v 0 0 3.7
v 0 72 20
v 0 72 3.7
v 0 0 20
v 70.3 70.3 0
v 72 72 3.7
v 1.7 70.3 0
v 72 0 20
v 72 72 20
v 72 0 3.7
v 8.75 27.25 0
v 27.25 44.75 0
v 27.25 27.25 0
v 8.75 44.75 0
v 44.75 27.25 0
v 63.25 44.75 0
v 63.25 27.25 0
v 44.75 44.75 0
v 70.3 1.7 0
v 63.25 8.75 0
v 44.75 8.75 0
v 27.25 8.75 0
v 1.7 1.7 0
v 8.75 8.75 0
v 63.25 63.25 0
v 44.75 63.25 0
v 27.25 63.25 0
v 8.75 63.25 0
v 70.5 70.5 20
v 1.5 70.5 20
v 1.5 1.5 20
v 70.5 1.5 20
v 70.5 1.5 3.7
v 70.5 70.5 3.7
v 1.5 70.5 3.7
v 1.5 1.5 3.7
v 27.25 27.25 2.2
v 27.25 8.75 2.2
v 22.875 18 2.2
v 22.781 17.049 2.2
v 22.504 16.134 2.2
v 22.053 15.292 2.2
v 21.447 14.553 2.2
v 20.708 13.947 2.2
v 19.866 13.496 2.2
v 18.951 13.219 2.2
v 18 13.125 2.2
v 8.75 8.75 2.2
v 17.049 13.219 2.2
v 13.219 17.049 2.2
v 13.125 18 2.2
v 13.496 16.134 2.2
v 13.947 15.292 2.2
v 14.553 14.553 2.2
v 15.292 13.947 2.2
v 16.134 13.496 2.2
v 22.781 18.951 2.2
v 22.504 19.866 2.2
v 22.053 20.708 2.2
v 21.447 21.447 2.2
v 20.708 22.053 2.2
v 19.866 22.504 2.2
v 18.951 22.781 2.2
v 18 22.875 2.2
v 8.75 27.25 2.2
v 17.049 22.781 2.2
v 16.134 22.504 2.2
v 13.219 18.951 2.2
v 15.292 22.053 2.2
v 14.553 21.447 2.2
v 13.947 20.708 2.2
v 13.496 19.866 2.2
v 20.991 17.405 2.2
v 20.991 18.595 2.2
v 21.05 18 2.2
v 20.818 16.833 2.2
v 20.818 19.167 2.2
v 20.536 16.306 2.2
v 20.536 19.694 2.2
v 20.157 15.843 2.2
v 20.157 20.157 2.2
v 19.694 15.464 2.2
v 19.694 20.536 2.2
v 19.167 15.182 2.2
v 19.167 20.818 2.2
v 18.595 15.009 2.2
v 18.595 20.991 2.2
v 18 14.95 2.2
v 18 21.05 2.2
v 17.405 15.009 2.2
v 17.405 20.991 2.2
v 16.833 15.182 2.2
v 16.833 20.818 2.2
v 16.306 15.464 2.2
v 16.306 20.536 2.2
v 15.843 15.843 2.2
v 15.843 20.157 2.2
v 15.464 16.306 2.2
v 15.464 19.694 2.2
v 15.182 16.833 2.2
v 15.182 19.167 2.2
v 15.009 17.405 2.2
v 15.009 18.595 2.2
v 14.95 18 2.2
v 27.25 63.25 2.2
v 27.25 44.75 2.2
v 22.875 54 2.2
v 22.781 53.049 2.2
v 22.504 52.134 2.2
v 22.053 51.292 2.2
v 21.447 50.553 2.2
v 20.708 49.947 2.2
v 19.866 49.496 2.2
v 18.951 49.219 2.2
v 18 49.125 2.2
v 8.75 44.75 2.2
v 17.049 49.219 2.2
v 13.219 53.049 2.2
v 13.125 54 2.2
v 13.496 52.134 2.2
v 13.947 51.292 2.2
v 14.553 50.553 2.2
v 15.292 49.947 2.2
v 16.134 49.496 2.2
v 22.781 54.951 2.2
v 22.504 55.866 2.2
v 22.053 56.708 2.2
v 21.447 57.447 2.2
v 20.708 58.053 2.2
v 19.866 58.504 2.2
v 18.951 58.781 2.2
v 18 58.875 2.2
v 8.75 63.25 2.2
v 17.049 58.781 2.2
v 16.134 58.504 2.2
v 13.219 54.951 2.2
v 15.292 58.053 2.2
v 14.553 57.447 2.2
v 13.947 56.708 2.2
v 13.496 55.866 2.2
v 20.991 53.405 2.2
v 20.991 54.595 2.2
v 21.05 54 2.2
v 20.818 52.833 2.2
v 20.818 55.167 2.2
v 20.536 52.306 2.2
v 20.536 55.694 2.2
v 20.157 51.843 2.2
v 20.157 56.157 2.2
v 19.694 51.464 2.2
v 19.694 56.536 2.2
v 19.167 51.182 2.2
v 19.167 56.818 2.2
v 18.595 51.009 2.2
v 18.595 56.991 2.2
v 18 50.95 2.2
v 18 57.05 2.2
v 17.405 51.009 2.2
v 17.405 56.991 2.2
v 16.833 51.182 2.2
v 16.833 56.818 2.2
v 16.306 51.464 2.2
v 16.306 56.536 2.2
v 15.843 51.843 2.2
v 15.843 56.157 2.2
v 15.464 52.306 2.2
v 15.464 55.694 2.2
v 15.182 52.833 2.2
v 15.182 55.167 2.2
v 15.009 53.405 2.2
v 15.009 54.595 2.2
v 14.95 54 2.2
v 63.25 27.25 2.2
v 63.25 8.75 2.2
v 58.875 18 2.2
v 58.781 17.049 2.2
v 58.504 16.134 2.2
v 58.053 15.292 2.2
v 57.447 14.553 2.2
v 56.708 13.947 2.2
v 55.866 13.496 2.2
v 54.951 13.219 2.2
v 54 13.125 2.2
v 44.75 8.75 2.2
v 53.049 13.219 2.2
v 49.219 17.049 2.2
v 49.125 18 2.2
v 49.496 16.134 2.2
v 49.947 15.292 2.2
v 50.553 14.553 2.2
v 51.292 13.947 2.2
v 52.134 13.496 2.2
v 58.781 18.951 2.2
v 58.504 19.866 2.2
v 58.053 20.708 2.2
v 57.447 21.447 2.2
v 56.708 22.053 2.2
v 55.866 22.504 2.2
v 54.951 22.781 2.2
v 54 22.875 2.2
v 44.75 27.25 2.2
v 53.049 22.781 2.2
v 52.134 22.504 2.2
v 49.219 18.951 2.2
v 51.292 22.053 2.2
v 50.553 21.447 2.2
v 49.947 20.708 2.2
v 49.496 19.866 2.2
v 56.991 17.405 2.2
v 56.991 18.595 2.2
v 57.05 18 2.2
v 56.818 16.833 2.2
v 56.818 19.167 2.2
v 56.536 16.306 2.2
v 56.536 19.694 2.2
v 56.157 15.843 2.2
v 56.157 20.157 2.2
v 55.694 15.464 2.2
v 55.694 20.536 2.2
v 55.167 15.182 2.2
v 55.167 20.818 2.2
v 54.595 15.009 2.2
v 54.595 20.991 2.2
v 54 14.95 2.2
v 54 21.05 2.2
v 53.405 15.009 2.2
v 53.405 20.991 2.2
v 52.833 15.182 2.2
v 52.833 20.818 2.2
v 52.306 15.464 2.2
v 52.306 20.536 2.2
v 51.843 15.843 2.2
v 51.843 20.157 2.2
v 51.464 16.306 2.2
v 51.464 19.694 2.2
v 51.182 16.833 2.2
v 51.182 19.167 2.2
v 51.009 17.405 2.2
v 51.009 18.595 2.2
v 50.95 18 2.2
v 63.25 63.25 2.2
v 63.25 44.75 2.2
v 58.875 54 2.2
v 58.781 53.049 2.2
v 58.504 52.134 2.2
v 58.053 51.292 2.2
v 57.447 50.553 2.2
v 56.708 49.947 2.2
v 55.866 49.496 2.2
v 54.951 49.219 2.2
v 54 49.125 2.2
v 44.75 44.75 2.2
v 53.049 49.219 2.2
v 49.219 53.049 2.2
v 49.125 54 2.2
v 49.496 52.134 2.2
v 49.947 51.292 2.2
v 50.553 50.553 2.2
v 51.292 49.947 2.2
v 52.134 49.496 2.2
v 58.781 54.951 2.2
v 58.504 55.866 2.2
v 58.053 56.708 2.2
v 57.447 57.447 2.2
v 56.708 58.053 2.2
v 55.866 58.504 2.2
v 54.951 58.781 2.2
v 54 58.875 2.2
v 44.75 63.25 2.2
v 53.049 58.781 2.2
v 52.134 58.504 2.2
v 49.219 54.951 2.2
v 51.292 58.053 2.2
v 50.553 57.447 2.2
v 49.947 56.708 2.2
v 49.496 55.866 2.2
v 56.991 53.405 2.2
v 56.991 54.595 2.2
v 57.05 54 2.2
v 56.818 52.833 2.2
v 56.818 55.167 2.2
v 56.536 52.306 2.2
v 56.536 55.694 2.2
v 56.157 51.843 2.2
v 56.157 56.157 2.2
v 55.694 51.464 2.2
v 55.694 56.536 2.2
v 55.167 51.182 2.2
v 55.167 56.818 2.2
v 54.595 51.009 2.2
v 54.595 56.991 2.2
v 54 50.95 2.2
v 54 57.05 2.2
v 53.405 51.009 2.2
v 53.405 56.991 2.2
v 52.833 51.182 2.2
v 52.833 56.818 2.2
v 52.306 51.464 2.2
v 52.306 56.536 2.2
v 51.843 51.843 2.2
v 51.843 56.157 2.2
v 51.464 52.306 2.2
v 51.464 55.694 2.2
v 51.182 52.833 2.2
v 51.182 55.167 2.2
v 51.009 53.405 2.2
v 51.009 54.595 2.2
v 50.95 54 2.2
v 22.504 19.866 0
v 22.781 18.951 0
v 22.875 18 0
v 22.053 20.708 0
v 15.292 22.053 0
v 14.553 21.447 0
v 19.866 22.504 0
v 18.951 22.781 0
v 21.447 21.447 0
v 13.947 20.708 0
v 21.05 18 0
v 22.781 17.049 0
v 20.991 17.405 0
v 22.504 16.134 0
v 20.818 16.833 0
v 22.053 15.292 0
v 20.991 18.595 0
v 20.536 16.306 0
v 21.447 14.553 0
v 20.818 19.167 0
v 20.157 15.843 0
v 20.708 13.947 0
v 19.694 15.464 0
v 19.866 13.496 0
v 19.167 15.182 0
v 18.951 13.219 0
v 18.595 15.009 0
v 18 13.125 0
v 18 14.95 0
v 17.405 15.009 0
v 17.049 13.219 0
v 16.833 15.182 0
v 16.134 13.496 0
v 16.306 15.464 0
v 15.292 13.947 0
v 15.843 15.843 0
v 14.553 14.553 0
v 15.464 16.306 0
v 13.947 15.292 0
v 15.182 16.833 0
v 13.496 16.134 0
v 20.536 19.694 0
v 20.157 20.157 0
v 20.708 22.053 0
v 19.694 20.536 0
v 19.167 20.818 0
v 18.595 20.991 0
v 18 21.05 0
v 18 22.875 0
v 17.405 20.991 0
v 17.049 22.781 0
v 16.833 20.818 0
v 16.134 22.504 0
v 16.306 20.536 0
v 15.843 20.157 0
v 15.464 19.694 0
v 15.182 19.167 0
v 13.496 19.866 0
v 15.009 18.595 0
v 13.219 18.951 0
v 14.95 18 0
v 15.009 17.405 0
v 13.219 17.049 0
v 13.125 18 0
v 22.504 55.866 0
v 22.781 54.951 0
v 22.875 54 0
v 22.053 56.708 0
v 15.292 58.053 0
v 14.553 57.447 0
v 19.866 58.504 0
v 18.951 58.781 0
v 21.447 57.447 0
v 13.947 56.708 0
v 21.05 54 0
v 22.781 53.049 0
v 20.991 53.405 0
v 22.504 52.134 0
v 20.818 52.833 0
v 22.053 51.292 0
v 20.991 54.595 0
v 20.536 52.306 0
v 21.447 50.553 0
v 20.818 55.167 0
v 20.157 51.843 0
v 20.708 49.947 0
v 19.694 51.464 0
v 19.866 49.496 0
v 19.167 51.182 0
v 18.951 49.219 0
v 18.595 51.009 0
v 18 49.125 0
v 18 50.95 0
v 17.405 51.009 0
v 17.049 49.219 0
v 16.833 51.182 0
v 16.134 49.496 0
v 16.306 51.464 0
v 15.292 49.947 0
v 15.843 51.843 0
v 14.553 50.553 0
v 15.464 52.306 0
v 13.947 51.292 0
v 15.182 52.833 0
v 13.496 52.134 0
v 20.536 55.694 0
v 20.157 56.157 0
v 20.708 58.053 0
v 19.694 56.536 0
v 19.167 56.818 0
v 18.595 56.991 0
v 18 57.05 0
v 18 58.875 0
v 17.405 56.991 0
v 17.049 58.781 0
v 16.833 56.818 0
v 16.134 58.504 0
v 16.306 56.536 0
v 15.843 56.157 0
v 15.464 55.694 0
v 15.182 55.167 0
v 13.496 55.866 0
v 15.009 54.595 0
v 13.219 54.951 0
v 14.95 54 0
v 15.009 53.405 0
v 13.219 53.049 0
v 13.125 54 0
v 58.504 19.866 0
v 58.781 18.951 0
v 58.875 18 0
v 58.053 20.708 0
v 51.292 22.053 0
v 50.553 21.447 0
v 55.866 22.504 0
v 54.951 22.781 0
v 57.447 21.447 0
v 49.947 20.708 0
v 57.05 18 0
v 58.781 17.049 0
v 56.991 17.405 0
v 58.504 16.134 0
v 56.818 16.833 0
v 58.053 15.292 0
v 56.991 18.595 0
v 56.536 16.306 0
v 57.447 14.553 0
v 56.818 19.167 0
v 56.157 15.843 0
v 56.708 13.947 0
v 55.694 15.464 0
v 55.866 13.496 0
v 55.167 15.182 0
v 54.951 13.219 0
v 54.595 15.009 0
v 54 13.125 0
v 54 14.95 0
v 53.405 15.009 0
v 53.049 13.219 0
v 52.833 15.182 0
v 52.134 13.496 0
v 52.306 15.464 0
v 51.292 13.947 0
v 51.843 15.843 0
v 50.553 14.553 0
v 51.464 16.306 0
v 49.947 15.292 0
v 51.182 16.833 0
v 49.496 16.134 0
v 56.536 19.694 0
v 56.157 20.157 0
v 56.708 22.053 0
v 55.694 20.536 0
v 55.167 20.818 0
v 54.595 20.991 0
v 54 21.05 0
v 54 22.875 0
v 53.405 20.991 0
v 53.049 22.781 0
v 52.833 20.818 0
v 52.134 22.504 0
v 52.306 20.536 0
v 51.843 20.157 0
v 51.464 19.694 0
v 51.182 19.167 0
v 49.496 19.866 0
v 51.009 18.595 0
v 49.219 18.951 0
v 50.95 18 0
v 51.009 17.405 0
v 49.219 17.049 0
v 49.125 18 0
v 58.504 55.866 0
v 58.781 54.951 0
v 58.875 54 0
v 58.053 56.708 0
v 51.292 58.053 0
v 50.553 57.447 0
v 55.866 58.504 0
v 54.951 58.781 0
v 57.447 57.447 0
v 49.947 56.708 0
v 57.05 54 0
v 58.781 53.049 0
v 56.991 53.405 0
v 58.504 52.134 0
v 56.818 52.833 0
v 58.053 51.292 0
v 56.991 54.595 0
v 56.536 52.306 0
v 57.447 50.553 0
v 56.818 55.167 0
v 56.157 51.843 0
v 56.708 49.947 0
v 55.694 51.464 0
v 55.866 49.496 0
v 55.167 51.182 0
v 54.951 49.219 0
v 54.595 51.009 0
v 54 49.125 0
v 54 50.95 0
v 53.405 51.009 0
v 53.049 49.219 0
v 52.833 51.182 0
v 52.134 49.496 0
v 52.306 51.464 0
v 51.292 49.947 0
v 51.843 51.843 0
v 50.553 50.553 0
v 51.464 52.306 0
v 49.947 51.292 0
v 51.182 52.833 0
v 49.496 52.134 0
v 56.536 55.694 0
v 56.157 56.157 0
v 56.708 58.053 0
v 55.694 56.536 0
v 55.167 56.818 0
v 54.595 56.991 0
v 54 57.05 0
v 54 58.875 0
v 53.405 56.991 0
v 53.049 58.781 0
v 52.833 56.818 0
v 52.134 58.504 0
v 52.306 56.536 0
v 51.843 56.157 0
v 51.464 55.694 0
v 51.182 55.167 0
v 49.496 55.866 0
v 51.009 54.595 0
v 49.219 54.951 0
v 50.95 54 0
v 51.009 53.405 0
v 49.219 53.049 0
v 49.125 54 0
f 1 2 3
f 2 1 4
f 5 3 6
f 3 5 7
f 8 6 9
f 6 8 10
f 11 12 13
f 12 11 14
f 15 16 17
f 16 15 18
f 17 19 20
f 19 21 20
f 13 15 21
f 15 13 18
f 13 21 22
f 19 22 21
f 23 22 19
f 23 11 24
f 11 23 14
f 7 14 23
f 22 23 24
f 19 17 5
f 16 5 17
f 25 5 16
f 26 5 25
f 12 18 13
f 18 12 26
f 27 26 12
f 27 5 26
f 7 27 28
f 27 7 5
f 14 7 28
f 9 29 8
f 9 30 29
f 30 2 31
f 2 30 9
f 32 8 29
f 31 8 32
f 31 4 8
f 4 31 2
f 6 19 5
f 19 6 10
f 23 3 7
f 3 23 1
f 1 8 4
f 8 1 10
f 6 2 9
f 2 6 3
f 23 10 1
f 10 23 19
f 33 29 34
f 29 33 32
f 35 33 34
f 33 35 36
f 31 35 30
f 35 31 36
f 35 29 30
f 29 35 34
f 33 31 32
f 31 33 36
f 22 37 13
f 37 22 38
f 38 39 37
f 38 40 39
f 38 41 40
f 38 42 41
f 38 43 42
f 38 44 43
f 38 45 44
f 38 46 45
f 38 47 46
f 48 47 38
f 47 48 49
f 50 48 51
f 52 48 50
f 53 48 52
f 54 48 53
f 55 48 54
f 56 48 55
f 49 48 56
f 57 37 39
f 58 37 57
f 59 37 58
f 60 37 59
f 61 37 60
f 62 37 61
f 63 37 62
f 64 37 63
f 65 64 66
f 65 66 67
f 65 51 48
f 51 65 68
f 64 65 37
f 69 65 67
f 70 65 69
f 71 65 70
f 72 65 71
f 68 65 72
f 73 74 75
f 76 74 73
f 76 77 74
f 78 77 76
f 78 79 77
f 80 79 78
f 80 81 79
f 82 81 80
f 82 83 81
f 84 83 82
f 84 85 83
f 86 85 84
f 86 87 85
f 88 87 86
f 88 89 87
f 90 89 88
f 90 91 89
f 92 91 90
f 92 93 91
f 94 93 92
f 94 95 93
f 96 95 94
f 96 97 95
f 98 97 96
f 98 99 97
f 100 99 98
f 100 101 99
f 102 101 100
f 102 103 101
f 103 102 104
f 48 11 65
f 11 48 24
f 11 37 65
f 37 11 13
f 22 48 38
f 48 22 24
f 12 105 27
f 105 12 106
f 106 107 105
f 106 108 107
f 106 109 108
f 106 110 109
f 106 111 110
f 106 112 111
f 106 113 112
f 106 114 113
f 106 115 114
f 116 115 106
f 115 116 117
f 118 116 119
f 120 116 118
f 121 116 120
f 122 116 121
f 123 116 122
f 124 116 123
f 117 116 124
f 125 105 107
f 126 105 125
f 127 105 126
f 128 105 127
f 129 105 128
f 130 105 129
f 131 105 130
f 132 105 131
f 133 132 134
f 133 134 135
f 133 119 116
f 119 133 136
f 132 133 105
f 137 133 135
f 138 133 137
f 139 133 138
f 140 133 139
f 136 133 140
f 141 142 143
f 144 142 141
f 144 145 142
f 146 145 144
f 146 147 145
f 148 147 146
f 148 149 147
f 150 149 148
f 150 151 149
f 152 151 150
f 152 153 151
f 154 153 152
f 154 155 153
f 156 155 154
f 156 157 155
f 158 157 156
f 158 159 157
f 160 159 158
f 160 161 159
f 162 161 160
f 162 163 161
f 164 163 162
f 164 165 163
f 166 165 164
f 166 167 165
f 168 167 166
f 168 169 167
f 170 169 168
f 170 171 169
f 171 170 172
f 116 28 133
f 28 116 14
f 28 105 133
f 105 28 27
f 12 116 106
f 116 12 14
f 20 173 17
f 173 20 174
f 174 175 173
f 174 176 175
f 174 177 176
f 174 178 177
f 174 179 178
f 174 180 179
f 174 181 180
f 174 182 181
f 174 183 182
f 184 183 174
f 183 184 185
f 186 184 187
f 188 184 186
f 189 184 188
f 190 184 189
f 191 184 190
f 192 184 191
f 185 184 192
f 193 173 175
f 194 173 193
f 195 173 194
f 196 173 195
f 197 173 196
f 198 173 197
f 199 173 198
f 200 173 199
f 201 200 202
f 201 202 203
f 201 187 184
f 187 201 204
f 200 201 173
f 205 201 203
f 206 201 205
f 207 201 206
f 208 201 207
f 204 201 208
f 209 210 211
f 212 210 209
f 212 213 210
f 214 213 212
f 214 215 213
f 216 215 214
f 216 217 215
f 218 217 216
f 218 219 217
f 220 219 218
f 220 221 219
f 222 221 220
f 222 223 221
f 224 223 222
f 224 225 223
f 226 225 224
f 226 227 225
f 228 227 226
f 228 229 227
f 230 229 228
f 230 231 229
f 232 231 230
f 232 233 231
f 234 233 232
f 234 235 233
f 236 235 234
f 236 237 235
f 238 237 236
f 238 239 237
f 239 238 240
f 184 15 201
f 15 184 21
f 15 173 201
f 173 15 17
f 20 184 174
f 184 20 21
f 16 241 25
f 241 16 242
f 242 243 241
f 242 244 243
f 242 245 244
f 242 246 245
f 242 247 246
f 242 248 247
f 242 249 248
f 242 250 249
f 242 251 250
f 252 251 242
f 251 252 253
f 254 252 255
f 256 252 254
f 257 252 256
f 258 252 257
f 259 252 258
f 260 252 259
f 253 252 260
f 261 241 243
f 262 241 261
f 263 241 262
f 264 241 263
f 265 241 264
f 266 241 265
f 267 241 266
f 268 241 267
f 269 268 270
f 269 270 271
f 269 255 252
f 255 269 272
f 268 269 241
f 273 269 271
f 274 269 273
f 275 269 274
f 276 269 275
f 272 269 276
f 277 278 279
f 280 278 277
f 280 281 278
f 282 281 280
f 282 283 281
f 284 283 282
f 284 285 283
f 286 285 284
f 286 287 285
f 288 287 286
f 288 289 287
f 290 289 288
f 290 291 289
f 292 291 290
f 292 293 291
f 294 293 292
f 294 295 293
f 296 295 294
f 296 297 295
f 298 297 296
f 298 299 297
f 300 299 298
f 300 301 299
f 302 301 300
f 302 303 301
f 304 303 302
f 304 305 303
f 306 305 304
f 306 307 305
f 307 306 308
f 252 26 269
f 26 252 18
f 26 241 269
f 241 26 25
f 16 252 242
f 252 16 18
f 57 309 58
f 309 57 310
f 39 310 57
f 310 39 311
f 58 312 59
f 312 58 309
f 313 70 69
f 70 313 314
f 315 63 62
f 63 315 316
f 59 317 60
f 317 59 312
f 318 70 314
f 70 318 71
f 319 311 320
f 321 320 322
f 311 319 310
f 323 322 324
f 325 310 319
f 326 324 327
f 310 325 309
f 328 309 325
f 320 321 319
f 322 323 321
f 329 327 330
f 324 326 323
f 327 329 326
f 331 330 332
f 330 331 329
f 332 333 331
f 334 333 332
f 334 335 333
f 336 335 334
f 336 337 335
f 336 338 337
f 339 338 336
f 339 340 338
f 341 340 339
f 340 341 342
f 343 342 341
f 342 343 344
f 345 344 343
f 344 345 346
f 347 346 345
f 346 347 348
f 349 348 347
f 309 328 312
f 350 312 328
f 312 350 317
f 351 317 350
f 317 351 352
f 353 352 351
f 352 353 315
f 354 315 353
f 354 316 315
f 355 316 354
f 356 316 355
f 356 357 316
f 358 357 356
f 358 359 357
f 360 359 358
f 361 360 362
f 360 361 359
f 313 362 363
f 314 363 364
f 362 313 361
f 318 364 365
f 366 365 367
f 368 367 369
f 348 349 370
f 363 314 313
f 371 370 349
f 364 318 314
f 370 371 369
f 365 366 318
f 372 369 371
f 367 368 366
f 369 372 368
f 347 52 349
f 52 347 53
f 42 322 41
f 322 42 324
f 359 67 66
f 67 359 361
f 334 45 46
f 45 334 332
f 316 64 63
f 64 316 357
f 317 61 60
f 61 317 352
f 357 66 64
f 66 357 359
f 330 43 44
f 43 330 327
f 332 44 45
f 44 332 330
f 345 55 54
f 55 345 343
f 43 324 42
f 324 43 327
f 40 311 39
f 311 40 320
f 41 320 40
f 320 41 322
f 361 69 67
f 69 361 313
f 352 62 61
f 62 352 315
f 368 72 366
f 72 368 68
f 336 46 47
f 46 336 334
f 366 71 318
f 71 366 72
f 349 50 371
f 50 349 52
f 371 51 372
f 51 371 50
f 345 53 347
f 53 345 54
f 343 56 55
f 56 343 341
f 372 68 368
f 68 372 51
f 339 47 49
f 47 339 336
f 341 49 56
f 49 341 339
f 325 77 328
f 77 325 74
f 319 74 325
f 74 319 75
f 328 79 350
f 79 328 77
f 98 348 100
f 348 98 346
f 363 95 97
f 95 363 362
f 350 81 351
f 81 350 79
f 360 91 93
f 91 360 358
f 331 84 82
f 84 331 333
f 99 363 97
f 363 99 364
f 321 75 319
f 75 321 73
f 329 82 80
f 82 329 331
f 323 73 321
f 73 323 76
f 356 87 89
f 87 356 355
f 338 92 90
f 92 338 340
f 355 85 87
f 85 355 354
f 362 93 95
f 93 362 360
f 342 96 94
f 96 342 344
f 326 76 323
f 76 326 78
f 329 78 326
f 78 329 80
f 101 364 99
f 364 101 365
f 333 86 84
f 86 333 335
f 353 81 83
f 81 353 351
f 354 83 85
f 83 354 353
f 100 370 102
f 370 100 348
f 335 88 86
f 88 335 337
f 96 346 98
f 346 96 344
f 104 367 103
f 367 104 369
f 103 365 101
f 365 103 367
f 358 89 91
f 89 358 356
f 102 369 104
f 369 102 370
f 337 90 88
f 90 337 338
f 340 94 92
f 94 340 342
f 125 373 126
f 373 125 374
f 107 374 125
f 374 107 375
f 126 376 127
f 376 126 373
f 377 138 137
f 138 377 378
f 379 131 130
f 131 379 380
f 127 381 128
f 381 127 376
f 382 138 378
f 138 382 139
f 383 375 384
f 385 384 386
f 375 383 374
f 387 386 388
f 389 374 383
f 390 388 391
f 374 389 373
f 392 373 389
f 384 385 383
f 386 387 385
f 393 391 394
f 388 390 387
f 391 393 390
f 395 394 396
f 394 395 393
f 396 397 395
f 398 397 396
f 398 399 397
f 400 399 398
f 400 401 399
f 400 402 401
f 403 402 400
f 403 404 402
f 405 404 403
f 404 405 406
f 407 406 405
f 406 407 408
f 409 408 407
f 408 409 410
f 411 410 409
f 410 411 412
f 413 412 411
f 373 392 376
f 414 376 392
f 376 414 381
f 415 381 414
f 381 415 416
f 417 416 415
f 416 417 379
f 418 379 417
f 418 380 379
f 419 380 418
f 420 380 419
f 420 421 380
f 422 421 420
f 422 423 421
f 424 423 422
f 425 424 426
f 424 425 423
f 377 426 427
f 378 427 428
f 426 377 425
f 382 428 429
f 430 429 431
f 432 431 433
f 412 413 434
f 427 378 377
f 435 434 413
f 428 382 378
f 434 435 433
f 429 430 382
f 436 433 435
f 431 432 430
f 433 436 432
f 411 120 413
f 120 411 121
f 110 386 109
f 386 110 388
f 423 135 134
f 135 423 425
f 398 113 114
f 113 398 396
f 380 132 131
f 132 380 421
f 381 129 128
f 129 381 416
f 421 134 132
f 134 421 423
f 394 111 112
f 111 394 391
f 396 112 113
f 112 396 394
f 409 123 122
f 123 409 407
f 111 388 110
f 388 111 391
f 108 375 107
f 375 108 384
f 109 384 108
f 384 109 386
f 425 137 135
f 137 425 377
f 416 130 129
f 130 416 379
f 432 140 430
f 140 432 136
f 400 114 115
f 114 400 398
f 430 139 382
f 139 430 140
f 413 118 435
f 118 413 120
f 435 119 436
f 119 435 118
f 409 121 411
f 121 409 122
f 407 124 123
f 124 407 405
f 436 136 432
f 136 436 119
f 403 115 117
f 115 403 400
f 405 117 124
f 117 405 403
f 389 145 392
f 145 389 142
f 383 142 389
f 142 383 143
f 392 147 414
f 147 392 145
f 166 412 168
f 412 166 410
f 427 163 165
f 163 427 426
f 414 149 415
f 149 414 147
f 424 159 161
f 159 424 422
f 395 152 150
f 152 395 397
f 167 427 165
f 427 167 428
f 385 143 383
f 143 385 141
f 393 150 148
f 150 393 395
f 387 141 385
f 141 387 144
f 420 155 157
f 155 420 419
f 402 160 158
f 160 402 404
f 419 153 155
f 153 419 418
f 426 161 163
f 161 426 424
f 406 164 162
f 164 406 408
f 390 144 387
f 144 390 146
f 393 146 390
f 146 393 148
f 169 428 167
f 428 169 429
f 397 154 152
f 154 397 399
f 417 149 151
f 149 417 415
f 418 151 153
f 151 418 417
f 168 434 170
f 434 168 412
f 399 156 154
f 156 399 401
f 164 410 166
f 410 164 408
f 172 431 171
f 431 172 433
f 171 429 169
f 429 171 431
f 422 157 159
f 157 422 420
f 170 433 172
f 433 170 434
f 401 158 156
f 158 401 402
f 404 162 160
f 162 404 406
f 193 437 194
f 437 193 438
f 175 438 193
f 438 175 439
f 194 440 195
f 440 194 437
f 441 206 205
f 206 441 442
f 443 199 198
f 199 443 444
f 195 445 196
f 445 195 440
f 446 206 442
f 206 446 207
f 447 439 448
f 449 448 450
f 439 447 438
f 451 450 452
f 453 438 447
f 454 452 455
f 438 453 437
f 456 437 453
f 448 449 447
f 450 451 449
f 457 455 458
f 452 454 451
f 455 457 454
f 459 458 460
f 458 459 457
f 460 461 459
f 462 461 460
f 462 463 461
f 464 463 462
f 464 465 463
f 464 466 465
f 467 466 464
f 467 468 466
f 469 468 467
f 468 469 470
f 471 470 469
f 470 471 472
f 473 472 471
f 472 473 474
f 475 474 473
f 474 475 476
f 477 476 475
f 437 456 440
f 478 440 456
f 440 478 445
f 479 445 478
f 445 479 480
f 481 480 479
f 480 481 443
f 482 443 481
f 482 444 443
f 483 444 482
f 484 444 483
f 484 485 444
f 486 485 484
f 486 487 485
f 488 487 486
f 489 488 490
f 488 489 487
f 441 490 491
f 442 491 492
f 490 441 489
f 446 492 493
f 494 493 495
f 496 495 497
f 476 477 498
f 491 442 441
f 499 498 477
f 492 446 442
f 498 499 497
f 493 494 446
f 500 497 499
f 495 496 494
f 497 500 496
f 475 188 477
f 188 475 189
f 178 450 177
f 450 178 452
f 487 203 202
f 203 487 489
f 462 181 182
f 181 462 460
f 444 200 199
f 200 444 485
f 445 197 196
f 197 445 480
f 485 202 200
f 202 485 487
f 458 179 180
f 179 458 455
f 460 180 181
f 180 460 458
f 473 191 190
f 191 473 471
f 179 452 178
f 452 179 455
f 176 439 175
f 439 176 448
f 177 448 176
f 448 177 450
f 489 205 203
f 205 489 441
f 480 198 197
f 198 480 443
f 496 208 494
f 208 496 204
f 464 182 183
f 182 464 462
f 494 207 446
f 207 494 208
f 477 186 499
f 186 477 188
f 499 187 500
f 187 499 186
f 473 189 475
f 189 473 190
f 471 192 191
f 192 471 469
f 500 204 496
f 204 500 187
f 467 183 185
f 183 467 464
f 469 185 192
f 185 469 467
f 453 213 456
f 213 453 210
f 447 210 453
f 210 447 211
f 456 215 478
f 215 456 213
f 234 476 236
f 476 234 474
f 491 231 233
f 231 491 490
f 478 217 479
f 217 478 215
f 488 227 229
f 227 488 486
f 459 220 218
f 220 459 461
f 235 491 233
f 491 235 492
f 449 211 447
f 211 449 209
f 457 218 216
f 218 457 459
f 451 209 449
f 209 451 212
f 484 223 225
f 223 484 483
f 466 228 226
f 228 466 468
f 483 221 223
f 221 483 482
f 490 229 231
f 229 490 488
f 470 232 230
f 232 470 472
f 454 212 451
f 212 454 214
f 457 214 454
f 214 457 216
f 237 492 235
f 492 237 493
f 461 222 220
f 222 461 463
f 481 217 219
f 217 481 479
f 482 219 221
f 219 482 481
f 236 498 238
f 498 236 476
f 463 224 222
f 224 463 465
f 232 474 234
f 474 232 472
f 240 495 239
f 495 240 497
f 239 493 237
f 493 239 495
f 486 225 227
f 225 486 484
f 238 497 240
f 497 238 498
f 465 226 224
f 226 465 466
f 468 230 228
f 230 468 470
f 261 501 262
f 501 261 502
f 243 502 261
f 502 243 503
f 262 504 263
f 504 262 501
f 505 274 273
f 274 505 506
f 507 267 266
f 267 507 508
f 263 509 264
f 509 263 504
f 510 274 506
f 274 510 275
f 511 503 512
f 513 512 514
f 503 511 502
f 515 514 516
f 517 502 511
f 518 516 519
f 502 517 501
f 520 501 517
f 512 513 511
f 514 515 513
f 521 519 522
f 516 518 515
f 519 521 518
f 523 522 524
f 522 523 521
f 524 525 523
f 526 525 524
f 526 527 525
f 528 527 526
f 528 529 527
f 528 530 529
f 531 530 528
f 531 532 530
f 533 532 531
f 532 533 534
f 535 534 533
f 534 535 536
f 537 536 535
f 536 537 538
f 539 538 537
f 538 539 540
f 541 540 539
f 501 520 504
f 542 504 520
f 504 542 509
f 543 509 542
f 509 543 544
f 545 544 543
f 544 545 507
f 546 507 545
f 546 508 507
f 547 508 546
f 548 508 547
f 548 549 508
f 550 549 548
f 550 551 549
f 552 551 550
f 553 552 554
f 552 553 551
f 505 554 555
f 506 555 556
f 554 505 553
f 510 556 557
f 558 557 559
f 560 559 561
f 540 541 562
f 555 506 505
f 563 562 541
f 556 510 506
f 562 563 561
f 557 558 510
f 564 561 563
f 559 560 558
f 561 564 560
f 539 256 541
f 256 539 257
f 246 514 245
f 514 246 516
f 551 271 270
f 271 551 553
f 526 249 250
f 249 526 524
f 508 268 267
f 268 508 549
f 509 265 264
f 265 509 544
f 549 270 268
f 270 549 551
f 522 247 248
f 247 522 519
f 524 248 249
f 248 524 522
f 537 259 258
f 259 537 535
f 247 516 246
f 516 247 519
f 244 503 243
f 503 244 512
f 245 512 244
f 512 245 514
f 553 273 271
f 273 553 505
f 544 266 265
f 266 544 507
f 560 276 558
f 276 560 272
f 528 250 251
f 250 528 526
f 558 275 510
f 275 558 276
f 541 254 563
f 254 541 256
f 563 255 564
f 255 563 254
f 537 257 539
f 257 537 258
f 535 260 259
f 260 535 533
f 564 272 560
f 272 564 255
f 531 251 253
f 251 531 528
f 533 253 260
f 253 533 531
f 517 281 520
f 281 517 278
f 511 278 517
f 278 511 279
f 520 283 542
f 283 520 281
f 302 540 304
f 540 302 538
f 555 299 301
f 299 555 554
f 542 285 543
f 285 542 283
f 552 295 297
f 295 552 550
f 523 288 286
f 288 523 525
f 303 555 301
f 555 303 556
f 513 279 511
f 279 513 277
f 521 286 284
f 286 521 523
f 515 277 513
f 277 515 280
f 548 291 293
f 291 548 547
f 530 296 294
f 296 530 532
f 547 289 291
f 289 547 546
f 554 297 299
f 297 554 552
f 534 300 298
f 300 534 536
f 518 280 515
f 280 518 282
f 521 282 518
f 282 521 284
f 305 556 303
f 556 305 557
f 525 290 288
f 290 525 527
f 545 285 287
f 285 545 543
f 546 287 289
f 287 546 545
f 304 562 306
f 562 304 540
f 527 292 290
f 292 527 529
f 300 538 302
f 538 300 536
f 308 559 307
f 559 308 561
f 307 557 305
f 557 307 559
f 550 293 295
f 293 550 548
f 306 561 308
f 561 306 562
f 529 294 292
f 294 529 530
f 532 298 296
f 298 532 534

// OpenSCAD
$fn = 32;

// The primary grid size
grid_size = 36;

bin_x = 2;
bin_y = 2;
bin_u = 1;
bin_h = bin_u*20;
bin_border = 1.5;
bin_clearance = 0;
base_base = 1.5;
interface_height = 2.2;
interface_size = grid_size/2;
interface_play = 0.25;

total_base = base_base + interface_height;
circular_interface=10;

magnet_diameter=6.1;
magnet_height = 2.2;

stack_slop = 0.2;

module draw_outer_bin() {
    cube( [ bin_x * grid_size - bin_clearance*2, bin_y*grid_size - bin_clearance*2, bin_h ] );
}

module draw_inner_bin() {
    translate( [bin_border, bin_border, total_base ] ) {
        cube( [ bin_x * grid_size - 2*bin_border - 2*bin_clearance, bin_y*grid_size - 2*bin_border - 2*bin_clearance, bin_h ] );
    }
}

module draw_interface( x, y ) {
    x_pos = x * grid_size + (grid_size - interface_size)/2 - interface_play;
    y_pos = y * grid_size + (grid_size - interface_size)/2 - interface_play; 
    
    translate( [ x_pos, y_pos, 0 ] ) {
        color( "white" ) cube( [ interface_size + 2*interface_play, interface_size + 2*interface_play, interface_height] );
    }
}
  
module add_magnet( x, y ) {
    x_pos = x * grid_size + (grid_size - interface_size)/2 + interface_size/2;
    y_pos = y * grid_size + (grid_size - interface_size)/2 + interface_size/2; 
    
    has_magnet = ( x == 0 && y == 0 ) || ( x == (bin_x-1) && y == 0 ) || 
                ( x == (bin_x-1) && y == (bin_y-1) ) || ( x == 0 && y == (bin_y-1) );
    
    if ( has_magnet ) {
        translate( [ x_pos, y_pos, 0 ] ) {
            difference() {

                color( "red" ) cylinder( h = interface_height + 0.1, r = (circular_interface - interface_play )/2 );
            
                cylinder( h = magnet_height, r = magnet_diameter/2 );
   
            }
        }
    }
}

module make_stackable() {
    difference() {
        cube( [ bin_x*grid_size, bin_y*grid_size, total_base ] );
        translate( [ bin_border+stack_slop, bin_border+stack_slop, 0 ] ) {
            cube( [ bin_x*grid_size - bin_border*2 - 2*stack_slop, bin_y*grid_size - bin_border*2 - 2*stack_slop, total_base  ] );
        }
    }
}

 difference() {

     translate( [ bin_clearance, bin_clearance, 0 ] ) {
        difference() {
        hull() {
            difference() {
                draw_outer_bin();
                make_stackable();
            }  
        }
            draw_inner_bin();
        }
     }
     
     for ( i = [ 0:1:( bin_x - 1 ) ] ) {
        for ( j = [ 0:1:( bin_y - 1 ) ] ) {
            draw_interface( i, j );
        }
     }
     
     //make_stackable();
}

     
     for ( i = [ 0:1:( bin_x - 1 ) ] ) {
        for ( j = [ 0:1:( bin_y - 1 ) ] ) {
            add_magnet( i, j );
        }
     }
